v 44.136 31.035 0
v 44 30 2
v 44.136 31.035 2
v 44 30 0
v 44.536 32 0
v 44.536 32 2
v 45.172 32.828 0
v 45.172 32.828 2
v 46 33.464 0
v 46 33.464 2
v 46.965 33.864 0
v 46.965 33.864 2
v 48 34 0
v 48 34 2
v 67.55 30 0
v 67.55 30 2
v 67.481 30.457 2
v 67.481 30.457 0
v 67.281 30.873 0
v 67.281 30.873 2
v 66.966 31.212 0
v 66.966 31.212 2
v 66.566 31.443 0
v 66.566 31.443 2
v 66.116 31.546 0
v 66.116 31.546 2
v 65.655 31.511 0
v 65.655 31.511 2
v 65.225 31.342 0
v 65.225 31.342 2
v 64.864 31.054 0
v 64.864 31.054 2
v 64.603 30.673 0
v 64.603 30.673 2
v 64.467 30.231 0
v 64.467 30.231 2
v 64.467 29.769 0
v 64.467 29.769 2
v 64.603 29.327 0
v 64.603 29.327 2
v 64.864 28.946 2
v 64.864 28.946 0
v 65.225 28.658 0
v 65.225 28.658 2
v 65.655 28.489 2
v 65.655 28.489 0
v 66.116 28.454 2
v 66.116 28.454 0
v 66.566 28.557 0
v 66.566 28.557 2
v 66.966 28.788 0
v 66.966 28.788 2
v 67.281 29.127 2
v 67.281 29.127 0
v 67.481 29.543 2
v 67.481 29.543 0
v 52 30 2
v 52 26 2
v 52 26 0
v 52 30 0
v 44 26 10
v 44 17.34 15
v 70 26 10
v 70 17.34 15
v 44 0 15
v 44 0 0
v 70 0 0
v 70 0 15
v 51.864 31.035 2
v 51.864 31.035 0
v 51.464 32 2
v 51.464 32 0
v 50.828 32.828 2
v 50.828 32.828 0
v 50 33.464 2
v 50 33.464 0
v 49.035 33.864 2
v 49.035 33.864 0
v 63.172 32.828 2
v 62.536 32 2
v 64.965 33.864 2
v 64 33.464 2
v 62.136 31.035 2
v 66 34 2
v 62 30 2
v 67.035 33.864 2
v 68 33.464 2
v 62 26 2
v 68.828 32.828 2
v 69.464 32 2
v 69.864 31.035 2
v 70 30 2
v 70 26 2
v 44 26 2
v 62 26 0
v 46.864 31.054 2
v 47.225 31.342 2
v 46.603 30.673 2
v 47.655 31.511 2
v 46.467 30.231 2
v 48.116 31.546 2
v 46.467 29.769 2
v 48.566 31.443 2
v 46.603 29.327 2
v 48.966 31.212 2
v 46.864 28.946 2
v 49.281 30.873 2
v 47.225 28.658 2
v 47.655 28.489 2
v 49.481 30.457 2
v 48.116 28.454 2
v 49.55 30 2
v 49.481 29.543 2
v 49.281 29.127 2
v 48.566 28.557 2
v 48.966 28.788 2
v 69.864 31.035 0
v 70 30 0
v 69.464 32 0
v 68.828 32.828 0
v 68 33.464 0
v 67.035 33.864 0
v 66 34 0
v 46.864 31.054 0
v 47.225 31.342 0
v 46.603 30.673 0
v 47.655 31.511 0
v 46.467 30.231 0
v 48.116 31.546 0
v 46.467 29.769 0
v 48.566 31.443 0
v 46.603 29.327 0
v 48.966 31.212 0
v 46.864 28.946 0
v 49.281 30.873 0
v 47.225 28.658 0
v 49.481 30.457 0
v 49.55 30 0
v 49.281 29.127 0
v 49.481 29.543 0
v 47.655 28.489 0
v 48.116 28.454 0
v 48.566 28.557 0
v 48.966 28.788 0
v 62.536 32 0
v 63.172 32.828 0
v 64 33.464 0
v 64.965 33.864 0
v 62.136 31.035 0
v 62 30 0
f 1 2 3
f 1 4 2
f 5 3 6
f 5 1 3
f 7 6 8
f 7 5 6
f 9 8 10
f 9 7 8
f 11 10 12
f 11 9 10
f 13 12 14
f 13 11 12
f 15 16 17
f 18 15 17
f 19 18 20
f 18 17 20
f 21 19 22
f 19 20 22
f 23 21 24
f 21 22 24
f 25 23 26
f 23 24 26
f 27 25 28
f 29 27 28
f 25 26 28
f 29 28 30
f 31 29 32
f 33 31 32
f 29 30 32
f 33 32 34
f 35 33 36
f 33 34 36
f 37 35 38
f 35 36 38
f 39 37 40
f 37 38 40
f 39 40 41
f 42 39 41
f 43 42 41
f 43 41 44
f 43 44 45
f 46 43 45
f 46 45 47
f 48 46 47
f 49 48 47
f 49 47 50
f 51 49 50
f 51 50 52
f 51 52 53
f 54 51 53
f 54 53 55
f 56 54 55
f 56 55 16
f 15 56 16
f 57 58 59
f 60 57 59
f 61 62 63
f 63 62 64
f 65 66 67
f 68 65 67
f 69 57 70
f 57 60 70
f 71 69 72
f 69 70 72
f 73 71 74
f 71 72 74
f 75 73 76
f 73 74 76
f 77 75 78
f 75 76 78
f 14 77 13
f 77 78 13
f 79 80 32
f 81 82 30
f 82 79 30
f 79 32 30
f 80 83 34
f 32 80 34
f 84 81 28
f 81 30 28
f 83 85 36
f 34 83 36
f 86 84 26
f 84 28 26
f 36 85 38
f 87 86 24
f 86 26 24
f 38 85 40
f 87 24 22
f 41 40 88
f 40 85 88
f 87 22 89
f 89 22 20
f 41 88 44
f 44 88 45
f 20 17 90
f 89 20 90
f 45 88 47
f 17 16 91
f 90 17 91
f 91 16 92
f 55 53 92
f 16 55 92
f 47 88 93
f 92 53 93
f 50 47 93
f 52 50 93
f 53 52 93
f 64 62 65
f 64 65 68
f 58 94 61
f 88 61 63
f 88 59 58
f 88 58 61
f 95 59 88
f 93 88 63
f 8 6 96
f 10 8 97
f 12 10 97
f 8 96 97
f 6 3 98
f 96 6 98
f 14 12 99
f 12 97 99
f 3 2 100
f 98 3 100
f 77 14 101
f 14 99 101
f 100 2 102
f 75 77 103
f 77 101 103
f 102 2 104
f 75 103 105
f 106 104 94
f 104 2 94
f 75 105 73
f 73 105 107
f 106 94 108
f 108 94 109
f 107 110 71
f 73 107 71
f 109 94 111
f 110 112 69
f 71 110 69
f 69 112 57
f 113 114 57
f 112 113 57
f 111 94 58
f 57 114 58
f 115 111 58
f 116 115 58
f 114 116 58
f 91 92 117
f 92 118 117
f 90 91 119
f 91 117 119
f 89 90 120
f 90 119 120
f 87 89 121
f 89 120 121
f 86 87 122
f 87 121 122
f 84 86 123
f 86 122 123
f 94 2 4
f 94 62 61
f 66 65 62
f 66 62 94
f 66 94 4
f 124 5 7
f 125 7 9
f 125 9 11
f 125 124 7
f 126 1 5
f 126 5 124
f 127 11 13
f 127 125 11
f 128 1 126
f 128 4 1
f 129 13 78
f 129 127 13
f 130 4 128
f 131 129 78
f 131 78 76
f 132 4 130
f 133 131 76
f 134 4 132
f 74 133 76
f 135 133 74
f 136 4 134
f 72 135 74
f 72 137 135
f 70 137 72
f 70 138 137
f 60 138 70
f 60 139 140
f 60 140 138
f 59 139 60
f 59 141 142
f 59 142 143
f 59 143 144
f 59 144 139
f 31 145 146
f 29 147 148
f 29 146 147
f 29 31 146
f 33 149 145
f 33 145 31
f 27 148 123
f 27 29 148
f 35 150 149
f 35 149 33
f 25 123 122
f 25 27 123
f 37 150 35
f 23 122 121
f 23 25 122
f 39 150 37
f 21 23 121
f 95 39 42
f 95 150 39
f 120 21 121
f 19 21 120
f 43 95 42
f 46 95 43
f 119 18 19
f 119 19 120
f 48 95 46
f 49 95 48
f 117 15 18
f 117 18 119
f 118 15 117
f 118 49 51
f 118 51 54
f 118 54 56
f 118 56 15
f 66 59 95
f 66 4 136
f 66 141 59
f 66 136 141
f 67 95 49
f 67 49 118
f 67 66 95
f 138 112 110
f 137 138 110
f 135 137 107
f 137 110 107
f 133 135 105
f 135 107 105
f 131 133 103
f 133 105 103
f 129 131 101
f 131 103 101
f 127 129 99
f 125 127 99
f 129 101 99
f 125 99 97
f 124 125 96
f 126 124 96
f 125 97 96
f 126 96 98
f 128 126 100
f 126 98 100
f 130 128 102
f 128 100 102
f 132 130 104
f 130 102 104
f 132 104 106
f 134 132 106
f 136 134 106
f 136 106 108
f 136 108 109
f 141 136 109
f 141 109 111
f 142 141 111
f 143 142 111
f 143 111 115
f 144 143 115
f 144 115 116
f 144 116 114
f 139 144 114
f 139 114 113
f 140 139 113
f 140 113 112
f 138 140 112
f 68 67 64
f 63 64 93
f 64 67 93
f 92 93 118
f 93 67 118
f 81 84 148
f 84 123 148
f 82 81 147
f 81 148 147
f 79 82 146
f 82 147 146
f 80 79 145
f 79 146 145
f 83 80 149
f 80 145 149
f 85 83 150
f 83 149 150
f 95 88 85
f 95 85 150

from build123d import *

# Parameters (mm, degrees)
SKETCH1_W           = 26
SKETCH1_H           = 26
BOSS_EXTRUDE1_DEPTH = 15
CHAMFER1_SIZE       = 5
CHAMFER1_SIZE2      = 8.660254038
SKETCH2_W           = 8
SKETCH2_H           = 2
BOSS_EXTRUDE2_DEPTH = 8
FILLET1_R           = 4
CUT_EXTRUDE2_REACH  = 80.899
SKETCH5_R           = 1.55


with BuildPart() as part:
    # Sketch1 → Boss-Extrude1 (new body)
    with BuildSketch(Plane.XY):
        with Locations((57, 13)):
            Rectangle(SKETCH1_W, SKETCH1_H)
    extrude(amount=BOSS_EXTRUDE1_DEPTH)

    # Chamfer1
    chamfer1_edges = [part.edges().sort_by_distance(p)[0] for p in [
        (57, 26, 15),
    ]]
    chamfer1_side = [part.faces().sort_by_distance(p)[0] for p in [
        (57, 26, 7.5),
    ]]
    chamfer(chamfer1_edges, length=CHAMFER1_SIZE, length2=CHAMFER1_SIZE2, reference=chamfer1_side[0])

    # Sketch2 → Boss-Extrude2 (add)
    with BuildSketch(Plane(origin=(0, 26, 0), x_dir=(1, 0, 0), z_dir=(0, 1, 0))):
        with Locations((48, -1)):
            Rectangle(SKETCH2_W, SKETCH2_H)
        with Locations((66, -1)):
            Rectangle(SKETCH2_W, SKETCH2_H)
    extrude(amount=BOSS_EXTRUDE2_DEPTH)

    # Fillet1
    fillet1_edges = [part.edges().sort_by_distance(p)[0] for p in [
        (44, 34, 1),
        (52, 34, 1),
        (62, 34, 1),
        (70, 34, 1),
    ]]
    fillet(fillet1_edges, radius=FILLET1_R - 0.0001)  # a hair under: the kernel refuses the full size

    # Sketch5 → Cut-Extrude2 (cut, up to next)
    with BuildSketch(Plane.XY.offset(2), mode=Mode.PRIVATE) as cut_extrude2_sk1:
        with Locations((66, 30)):
            Circle(SKETCH5_R)
    cut_extrude2_tool1 = extrude(cut_extrude2_sk1.sketch, amount=-CUT_EXTRUDE2_REACH, mode=Mode.PRIVATE) & part.part
    # Sketch5 → Cut-Extrude2 (cut, up to next)
    with BuildSketch(Plane.XY.offset(2), mode=Mode.PRIVATE) as cut_extrude2_sk2:
        with Locations((48, 30)):
            Circle(SKETCH5_R)
    cut_extrude2_tool2 = extrude(cut_extrude2_sk2.sketch, amount=-CUT_EXTRUDE2_REACH, mode=Mode.PRIVATE) & part.part
    add(cut_extrude2_tool1.solids().sort_by_distance((66, 30, 2))[0], mode=Mode.SUBTRACT)
    add(cut_extrude2_tool2.solids().sort_by_distance((48, 30, 2))[0], mode=Mode.SUBTRACT)


solid = part.part
